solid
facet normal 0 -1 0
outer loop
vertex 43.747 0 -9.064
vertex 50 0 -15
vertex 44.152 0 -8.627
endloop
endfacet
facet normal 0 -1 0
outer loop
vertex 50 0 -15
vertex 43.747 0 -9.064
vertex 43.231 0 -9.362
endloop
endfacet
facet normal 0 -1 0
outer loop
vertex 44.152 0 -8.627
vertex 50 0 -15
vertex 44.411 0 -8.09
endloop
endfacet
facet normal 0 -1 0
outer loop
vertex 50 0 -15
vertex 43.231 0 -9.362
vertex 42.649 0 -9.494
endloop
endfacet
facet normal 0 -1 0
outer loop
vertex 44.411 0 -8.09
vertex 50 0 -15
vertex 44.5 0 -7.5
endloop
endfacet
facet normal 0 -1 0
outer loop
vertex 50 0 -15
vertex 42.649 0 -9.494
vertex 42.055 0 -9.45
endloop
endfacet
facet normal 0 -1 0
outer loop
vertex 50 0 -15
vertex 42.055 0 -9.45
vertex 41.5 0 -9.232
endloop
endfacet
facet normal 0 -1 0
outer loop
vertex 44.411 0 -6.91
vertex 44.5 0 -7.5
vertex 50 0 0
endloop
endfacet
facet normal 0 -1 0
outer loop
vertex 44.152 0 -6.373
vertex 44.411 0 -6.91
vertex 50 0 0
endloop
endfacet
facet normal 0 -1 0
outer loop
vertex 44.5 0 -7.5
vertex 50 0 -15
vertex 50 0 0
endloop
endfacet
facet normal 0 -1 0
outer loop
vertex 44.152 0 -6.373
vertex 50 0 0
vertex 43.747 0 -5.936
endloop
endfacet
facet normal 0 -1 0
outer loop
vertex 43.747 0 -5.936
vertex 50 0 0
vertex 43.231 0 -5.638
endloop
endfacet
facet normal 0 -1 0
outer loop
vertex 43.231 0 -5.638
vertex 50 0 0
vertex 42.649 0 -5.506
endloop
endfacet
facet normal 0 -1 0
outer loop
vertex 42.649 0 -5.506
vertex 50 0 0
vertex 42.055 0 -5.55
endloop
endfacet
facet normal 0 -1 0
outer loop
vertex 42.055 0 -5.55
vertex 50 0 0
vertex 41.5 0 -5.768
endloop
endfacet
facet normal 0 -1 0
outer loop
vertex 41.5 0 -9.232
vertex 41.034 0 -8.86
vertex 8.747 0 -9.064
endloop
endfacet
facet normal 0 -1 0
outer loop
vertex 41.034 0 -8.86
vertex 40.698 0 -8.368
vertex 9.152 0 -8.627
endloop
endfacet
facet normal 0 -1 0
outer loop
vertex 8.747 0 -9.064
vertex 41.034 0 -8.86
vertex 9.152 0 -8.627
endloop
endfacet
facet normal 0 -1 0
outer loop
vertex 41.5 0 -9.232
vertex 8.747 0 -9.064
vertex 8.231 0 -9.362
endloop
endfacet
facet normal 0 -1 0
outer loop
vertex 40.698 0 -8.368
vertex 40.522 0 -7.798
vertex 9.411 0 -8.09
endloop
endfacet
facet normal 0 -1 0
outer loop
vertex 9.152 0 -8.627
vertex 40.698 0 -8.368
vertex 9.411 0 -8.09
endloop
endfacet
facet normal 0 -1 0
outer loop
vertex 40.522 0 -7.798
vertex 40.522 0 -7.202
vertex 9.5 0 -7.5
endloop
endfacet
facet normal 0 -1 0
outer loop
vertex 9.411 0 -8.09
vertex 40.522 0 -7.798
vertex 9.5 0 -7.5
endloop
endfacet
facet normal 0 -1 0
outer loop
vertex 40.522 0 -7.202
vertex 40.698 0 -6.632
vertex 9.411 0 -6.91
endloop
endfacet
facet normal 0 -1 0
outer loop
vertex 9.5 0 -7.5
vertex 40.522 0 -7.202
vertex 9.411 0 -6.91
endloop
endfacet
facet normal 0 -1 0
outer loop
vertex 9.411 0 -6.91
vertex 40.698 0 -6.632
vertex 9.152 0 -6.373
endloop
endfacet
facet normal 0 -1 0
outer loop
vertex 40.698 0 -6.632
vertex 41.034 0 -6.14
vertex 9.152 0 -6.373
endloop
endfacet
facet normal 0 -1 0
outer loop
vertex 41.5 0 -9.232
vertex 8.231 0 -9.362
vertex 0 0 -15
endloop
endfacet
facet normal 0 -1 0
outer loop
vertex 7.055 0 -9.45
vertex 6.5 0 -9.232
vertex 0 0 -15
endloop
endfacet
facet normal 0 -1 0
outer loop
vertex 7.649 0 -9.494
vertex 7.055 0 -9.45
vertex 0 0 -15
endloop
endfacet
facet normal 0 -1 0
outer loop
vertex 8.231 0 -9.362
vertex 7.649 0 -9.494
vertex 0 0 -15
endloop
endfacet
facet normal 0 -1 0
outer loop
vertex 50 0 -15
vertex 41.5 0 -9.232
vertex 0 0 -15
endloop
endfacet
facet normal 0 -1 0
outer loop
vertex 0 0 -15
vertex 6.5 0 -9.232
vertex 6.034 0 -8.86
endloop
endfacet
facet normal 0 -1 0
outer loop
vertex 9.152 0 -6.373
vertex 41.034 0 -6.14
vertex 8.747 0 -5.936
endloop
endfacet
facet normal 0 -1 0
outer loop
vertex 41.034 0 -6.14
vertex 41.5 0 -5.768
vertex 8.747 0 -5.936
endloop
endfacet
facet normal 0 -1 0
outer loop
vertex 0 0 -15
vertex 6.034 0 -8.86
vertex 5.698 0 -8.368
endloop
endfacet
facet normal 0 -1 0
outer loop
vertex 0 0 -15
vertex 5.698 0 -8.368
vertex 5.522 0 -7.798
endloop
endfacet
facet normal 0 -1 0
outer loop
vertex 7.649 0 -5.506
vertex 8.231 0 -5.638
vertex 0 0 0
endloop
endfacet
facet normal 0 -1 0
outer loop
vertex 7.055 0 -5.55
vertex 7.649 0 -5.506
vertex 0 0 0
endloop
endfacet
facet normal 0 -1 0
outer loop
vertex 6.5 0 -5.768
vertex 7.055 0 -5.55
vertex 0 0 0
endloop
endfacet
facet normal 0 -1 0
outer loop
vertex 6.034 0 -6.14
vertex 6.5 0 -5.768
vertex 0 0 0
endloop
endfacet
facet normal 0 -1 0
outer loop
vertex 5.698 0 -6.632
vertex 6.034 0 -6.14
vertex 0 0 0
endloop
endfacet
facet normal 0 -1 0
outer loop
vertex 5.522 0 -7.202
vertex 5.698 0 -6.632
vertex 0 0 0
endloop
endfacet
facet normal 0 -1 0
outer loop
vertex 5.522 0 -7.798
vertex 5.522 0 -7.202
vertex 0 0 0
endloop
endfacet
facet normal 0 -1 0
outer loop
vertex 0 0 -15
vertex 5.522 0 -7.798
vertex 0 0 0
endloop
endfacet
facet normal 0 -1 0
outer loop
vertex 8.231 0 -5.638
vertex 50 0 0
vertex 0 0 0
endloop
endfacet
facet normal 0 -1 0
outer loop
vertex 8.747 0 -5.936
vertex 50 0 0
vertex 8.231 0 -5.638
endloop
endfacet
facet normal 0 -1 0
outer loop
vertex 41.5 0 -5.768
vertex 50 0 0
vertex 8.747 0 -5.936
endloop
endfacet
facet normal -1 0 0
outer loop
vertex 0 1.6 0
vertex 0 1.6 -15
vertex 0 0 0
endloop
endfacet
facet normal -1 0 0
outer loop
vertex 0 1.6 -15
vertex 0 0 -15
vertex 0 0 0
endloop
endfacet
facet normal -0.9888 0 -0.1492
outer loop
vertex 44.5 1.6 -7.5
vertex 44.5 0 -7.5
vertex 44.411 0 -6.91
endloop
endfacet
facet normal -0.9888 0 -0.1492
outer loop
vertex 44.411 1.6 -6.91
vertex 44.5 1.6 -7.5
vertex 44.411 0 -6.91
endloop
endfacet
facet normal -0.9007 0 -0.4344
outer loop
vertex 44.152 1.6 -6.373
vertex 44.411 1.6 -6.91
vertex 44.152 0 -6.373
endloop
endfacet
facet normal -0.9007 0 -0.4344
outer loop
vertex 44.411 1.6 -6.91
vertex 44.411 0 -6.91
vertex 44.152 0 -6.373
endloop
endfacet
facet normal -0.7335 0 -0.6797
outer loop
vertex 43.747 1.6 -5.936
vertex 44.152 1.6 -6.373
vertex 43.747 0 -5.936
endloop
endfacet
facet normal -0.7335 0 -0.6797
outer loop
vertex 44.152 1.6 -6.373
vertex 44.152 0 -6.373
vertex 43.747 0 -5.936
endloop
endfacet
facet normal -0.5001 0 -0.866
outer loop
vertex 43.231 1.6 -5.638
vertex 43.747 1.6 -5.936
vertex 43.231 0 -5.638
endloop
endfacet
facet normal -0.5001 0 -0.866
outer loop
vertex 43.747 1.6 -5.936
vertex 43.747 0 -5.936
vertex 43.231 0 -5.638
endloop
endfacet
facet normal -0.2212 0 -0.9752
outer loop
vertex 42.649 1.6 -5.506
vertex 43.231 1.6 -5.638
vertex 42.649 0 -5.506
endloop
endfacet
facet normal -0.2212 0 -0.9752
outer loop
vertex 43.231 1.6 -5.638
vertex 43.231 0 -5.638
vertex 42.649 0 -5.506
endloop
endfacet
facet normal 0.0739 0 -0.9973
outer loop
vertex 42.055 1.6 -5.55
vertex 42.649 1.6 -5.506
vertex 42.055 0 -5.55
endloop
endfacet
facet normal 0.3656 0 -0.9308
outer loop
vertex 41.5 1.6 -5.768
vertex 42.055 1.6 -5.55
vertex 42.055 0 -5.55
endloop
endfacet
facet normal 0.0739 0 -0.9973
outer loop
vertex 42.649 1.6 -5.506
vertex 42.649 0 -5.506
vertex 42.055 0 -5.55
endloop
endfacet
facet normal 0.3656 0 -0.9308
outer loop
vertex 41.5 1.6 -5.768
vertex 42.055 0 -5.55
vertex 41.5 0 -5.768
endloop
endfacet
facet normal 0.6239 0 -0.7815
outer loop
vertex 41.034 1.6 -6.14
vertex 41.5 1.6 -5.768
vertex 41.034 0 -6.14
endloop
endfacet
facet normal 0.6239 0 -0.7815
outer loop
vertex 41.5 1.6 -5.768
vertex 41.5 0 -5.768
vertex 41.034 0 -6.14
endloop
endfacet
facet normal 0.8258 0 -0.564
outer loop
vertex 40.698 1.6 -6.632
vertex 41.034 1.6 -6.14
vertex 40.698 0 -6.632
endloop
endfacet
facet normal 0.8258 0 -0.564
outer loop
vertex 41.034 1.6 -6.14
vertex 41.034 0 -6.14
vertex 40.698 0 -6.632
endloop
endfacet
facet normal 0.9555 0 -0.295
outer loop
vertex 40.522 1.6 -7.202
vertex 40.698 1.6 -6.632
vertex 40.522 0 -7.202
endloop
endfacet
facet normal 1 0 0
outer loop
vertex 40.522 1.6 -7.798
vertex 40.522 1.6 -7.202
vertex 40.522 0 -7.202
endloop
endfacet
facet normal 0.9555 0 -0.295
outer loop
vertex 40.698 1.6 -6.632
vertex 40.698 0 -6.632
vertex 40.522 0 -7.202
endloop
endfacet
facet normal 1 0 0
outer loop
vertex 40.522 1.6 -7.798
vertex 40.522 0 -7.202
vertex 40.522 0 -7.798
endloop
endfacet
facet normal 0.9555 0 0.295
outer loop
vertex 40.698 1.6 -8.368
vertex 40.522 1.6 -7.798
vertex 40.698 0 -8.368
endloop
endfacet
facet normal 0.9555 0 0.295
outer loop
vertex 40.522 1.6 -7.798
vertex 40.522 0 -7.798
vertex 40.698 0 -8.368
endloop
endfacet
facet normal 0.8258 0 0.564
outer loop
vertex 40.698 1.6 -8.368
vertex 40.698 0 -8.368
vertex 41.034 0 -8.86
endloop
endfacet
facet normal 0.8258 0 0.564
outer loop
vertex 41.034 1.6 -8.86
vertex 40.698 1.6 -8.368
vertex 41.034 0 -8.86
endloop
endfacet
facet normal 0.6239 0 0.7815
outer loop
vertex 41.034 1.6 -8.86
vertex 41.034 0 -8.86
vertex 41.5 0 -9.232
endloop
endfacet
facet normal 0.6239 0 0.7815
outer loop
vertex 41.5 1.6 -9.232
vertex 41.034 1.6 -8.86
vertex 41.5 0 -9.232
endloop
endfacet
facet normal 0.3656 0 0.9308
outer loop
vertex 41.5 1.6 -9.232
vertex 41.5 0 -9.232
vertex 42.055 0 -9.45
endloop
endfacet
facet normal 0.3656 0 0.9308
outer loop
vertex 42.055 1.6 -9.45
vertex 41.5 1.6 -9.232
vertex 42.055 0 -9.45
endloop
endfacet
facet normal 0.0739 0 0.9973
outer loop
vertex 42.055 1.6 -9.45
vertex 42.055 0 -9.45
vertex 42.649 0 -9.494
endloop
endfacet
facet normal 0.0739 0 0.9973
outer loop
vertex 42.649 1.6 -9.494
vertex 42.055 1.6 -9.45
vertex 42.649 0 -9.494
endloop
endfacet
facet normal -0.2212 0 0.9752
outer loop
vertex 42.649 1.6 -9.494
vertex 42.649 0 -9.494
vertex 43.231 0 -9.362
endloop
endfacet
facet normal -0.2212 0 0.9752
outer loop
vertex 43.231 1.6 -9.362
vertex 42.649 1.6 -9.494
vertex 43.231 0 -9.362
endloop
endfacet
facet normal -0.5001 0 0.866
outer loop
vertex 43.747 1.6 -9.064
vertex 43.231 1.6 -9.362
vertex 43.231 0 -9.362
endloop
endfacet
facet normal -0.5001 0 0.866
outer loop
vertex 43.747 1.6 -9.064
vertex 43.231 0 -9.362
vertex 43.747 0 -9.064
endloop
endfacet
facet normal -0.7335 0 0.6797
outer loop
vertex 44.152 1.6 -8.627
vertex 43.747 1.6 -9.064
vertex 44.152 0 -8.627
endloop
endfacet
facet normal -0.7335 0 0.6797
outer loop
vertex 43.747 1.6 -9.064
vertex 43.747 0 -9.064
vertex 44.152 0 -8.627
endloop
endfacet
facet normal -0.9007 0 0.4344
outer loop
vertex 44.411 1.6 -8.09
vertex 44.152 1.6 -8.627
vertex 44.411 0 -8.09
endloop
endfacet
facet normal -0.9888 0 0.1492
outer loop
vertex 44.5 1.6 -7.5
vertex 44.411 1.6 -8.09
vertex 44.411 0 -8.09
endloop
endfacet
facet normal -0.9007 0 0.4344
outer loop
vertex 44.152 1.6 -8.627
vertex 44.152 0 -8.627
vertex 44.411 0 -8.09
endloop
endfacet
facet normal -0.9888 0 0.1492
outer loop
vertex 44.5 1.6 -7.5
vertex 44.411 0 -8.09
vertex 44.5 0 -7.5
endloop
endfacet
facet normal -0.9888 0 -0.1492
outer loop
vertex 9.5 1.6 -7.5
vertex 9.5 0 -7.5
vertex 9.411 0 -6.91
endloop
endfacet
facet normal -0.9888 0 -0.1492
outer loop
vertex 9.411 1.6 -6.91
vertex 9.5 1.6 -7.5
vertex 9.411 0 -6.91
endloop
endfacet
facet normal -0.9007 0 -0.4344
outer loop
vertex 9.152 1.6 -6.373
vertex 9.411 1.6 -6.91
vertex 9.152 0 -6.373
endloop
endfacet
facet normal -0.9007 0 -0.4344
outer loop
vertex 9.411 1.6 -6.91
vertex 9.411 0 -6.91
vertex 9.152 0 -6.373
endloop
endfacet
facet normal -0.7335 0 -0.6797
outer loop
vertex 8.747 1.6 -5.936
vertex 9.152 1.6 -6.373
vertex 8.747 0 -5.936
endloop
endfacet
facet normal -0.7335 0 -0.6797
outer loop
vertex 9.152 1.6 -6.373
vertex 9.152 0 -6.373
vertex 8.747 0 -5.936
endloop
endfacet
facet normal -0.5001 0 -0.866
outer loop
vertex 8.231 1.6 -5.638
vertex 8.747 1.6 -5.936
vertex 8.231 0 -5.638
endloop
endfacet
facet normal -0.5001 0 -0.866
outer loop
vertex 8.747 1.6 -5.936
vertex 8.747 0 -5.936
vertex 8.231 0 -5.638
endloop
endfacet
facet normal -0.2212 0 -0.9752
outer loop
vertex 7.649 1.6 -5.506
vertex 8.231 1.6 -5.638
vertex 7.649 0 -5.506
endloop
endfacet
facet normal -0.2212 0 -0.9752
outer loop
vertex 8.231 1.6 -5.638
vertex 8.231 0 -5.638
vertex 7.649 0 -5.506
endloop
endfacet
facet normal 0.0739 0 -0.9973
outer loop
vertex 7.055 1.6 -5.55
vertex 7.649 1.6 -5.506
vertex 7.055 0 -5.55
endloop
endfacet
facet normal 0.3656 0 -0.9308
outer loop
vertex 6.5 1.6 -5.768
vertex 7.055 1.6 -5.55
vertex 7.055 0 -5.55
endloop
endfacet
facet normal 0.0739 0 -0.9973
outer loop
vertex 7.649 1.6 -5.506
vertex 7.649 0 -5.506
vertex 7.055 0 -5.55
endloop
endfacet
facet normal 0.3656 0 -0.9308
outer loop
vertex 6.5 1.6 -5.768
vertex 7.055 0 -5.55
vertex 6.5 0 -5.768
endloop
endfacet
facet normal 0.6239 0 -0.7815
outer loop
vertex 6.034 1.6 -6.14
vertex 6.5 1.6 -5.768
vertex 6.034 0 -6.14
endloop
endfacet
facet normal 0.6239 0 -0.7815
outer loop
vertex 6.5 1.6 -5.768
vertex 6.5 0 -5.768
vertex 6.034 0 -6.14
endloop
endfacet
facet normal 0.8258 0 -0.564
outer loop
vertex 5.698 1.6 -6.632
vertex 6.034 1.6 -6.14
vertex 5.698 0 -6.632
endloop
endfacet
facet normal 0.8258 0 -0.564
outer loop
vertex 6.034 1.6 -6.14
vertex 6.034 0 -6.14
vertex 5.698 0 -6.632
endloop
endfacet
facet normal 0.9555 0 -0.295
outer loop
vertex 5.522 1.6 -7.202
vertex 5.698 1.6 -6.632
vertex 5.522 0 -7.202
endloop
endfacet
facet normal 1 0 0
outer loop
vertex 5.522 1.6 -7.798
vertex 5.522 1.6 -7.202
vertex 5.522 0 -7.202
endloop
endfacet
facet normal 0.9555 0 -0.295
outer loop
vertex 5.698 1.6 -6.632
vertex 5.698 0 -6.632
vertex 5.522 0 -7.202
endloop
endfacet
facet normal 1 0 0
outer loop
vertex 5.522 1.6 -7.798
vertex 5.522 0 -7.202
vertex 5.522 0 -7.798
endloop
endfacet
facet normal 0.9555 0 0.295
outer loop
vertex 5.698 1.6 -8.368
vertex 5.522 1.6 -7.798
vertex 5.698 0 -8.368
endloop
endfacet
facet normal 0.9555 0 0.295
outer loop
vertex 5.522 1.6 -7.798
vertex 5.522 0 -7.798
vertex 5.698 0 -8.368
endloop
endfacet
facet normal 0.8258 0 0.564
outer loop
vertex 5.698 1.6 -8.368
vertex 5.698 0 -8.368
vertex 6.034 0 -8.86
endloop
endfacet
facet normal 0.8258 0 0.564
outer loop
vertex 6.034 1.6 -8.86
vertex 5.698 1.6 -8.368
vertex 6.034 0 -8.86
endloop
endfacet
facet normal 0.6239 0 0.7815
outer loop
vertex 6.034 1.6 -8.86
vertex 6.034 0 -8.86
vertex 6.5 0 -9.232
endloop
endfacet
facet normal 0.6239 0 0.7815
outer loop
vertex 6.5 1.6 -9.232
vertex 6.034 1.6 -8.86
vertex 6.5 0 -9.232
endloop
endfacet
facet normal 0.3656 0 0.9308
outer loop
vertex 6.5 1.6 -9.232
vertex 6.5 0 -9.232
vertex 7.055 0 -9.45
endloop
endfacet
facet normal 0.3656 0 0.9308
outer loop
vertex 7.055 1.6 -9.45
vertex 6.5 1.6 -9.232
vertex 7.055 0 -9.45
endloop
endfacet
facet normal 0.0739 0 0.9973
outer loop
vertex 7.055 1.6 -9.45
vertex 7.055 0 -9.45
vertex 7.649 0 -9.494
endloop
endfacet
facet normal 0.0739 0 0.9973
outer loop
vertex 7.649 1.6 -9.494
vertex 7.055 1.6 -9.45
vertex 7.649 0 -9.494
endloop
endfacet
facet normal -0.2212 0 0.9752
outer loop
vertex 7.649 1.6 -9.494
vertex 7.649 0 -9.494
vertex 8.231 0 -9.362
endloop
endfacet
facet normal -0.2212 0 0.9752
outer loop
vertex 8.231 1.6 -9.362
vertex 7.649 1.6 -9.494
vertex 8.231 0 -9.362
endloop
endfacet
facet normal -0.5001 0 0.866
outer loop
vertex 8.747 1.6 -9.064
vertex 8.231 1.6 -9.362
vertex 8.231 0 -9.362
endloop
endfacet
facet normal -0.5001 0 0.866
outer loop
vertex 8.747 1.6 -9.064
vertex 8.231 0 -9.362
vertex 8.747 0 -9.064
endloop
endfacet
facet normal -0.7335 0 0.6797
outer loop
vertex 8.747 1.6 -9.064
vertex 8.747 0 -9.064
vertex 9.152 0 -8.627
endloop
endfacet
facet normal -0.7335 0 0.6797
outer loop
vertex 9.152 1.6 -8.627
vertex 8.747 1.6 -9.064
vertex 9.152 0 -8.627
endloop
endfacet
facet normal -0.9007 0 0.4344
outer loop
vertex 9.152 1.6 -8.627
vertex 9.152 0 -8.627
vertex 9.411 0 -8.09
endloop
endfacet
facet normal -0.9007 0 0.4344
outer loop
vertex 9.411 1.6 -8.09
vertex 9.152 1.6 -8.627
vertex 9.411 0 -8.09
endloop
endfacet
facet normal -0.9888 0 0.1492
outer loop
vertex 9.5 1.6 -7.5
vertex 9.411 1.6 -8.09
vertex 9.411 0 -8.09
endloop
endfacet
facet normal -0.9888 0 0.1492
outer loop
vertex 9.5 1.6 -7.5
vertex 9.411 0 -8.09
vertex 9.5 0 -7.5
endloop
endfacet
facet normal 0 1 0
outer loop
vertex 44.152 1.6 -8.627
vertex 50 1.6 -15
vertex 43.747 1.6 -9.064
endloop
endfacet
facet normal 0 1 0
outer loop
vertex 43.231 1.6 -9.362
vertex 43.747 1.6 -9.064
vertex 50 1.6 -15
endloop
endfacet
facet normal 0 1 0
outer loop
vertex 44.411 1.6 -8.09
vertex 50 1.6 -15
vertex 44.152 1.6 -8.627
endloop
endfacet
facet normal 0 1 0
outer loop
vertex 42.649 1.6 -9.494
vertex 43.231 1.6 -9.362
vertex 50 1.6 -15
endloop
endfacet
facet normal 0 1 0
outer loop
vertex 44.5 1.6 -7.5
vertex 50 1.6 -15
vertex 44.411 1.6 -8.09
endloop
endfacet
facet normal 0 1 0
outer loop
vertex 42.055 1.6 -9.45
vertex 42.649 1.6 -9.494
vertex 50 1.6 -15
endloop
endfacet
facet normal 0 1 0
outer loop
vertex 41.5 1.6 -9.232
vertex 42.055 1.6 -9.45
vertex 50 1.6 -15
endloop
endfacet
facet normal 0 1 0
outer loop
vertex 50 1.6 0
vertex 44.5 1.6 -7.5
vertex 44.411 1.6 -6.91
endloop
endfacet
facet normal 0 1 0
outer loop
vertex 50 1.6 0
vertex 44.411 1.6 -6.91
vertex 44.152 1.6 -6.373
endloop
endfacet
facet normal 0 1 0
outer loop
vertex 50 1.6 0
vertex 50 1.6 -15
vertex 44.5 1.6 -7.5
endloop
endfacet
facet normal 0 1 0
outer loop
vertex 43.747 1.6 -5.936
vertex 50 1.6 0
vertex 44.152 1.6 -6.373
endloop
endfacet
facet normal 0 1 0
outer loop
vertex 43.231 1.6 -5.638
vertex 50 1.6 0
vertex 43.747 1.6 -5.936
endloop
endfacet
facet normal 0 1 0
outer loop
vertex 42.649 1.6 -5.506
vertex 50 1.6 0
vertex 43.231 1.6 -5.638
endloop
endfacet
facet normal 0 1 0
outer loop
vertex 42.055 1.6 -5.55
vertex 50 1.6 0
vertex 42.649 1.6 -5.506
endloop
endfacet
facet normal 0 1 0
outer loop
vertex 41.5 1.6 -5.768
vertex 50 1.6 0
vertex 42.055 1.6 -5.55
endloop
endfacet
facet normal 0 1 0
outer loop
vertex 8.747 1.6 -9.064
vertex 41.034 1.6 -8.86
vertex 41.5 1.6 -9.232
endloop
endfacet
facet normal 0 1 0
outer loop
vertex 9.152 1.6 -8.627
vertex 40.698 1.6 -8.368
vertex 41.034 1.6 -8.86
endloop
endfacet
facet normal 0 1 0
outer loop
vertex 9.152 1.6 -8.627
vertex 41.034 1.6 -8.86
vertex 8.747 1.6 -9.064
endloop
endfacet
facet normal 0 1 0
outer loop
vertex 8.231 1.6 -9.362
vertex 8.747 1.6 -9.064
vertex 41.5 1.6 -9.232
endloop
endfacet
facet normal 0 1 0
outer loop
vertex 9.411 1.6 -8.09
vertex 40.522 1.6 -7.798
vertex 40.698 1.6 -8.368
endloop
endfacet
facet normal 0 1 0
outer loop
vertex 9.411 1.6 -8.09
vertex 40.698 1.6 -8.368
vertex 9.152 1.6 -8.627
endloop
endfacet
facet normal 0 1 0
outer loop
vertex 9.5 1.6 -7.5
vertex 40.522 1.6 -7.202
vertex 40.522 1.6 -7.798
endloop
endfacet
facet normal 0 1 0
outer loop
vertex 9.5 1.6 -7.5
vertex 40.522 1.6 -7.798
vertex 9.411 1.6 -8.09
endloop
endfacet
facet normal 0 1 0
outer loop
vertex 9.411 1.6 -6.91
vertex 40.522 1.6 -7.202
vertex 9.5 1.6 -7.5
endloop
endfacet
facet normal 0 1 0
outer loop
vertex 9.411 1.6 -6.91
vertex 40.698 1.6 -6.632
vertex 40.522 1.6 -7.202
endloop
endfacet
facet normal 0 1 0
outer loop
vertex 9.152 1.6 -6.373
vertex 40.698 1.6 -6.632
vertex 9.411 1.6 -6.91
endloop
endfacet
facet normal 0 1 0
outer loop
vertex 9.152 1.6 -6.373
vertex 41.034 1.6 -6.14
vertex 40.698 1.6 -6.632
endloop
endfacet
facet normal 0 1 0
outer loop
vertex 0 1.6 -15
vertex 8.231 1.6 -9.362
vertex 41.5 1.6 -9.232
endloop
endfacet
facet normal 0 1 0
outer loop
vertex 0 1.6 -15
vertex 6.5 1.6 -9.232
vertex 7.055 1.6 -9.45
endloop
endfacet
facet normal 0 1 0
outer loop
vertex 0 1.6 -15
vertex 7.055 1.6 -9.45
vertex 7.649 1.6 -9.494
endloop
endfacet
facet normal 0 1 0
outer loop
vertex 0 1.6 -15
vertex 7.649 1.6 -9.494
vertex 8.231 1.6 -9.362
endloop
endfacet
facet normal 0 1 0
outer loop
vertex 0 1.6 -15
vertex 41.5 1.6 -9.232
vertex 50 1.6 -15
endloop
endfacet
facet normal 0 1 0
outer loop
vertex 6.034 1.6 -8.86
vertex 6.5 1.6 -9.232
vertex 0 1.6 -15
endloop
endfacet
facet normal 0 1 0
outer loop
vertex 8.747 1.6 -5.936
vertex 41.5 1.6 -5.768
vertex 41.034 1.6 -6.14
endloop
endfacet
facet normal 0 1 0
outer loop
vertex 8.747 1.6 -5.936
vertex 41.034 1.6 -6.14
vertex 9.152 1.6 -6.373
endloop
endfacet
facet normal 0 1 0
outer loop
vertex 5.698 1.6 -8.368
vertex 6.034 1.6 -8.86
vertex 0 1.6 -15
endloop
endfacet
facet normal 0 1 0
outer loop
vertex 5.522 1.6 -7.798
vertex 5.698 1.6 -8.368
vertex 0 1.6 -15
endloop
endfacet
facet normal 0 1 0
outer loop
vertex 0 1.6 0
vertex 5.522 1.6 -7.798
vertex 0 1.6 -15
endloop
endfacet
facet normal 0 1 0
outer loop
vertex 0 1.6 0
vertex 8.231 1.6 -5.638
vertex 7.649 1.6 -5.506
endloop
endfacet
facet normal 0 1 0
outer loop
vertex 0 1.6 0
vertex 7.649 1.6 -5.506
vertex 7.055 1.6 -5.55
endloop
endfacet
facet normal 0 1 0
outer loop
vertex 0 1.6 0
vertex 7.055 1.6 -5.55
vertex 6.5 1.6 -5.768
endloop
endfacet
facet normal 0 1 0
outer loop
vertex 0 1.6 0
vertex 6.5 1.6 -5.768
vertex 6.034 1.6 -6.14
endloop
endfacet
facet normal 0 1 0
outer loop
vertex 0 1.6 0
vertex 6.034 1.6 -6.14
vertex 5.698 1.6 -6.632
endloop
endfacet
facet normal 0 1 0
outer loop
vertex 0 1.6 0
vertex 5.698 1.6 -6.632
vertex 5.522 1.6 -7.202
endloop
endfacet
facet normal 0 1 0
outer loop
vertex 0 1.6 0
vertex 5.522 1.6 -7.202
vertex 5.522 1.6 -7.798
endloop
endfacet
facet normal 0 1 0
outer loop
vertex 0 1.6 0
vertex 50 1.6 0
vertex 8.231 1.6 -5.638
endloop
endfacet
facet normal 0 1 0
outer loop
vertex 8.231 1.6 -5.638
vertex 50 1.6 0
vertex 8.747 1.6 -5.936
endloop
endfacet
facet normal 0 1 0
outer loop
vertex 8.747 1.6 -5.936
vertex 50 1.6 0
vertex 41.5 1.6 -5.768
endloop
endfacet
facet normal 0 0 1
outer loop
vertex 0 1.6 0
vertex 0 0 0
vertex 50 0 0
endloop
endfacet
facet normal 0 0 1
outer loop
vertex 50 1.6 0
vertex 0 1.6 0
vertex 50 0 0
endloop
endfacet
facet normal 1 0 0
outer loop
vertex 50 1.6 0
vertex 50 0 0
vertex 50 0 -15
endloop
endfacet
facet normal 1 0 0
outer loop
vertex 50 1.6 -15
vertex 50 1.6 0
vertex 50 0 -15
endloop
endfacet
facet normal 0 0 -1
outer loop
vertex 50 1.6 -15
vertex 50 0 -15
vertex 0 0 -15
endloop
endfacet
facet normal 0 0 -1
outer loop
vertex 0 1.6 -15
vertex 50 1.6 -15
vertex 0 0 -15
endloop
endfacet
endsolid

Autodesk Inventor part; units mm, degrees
ref_plane "YZ Plane" through (0, 0, 0) normal (1, 0, 0) x (0, 1, 0)
ref_plane "XZ Plane" through (0, 0, 0) normal (0, 1, 0) x (-1, 0, 0)
ref_plane "XY Plane" through (0, 0, 0) normal (0, 0, 1) x (1, 0, 0)
sketch "Sketch1" plane through (0, 0, 0) normal (0, 1, 0) x (-1, 0, 0)
  line L0 (0, 0) -> (-50, 0)
  line L1 (-50, 0) -> (-50, -15)
  line L2 (-50, -15) -> (0, -15)
  line L3 (0, -15) -> (0, 0)
  dimension "d0" = 50
  dimension "d1" = 15
extrude "Extrusion1" add sketch "Sketch1" along normal blind 1.6
sketch "Sketch2" plane through (0, 0, 0) normal (0, -1, 0) x (1, 0, 0)
  circle A0 centre (7.5, -7.5) radius 2
  line L0 (0, -15) -> (0, 0) projected
  circle A1 centre (42.5, -7.5) radius 2
  line L1 (50, 0) -> (50, -15) projected
  point P0 (0, -7.5)
  point P1 (50, -7.5)
  dimension "d4" = 4
  dimension "d5" = 7.5
  dimension "d6" = 4
  dimension "d7" = 7.5
extrude "Extrusion2" cut sketch "Sketch2" against normal blind 10
properties part number "Latch Catch Piece" material "Steel"
